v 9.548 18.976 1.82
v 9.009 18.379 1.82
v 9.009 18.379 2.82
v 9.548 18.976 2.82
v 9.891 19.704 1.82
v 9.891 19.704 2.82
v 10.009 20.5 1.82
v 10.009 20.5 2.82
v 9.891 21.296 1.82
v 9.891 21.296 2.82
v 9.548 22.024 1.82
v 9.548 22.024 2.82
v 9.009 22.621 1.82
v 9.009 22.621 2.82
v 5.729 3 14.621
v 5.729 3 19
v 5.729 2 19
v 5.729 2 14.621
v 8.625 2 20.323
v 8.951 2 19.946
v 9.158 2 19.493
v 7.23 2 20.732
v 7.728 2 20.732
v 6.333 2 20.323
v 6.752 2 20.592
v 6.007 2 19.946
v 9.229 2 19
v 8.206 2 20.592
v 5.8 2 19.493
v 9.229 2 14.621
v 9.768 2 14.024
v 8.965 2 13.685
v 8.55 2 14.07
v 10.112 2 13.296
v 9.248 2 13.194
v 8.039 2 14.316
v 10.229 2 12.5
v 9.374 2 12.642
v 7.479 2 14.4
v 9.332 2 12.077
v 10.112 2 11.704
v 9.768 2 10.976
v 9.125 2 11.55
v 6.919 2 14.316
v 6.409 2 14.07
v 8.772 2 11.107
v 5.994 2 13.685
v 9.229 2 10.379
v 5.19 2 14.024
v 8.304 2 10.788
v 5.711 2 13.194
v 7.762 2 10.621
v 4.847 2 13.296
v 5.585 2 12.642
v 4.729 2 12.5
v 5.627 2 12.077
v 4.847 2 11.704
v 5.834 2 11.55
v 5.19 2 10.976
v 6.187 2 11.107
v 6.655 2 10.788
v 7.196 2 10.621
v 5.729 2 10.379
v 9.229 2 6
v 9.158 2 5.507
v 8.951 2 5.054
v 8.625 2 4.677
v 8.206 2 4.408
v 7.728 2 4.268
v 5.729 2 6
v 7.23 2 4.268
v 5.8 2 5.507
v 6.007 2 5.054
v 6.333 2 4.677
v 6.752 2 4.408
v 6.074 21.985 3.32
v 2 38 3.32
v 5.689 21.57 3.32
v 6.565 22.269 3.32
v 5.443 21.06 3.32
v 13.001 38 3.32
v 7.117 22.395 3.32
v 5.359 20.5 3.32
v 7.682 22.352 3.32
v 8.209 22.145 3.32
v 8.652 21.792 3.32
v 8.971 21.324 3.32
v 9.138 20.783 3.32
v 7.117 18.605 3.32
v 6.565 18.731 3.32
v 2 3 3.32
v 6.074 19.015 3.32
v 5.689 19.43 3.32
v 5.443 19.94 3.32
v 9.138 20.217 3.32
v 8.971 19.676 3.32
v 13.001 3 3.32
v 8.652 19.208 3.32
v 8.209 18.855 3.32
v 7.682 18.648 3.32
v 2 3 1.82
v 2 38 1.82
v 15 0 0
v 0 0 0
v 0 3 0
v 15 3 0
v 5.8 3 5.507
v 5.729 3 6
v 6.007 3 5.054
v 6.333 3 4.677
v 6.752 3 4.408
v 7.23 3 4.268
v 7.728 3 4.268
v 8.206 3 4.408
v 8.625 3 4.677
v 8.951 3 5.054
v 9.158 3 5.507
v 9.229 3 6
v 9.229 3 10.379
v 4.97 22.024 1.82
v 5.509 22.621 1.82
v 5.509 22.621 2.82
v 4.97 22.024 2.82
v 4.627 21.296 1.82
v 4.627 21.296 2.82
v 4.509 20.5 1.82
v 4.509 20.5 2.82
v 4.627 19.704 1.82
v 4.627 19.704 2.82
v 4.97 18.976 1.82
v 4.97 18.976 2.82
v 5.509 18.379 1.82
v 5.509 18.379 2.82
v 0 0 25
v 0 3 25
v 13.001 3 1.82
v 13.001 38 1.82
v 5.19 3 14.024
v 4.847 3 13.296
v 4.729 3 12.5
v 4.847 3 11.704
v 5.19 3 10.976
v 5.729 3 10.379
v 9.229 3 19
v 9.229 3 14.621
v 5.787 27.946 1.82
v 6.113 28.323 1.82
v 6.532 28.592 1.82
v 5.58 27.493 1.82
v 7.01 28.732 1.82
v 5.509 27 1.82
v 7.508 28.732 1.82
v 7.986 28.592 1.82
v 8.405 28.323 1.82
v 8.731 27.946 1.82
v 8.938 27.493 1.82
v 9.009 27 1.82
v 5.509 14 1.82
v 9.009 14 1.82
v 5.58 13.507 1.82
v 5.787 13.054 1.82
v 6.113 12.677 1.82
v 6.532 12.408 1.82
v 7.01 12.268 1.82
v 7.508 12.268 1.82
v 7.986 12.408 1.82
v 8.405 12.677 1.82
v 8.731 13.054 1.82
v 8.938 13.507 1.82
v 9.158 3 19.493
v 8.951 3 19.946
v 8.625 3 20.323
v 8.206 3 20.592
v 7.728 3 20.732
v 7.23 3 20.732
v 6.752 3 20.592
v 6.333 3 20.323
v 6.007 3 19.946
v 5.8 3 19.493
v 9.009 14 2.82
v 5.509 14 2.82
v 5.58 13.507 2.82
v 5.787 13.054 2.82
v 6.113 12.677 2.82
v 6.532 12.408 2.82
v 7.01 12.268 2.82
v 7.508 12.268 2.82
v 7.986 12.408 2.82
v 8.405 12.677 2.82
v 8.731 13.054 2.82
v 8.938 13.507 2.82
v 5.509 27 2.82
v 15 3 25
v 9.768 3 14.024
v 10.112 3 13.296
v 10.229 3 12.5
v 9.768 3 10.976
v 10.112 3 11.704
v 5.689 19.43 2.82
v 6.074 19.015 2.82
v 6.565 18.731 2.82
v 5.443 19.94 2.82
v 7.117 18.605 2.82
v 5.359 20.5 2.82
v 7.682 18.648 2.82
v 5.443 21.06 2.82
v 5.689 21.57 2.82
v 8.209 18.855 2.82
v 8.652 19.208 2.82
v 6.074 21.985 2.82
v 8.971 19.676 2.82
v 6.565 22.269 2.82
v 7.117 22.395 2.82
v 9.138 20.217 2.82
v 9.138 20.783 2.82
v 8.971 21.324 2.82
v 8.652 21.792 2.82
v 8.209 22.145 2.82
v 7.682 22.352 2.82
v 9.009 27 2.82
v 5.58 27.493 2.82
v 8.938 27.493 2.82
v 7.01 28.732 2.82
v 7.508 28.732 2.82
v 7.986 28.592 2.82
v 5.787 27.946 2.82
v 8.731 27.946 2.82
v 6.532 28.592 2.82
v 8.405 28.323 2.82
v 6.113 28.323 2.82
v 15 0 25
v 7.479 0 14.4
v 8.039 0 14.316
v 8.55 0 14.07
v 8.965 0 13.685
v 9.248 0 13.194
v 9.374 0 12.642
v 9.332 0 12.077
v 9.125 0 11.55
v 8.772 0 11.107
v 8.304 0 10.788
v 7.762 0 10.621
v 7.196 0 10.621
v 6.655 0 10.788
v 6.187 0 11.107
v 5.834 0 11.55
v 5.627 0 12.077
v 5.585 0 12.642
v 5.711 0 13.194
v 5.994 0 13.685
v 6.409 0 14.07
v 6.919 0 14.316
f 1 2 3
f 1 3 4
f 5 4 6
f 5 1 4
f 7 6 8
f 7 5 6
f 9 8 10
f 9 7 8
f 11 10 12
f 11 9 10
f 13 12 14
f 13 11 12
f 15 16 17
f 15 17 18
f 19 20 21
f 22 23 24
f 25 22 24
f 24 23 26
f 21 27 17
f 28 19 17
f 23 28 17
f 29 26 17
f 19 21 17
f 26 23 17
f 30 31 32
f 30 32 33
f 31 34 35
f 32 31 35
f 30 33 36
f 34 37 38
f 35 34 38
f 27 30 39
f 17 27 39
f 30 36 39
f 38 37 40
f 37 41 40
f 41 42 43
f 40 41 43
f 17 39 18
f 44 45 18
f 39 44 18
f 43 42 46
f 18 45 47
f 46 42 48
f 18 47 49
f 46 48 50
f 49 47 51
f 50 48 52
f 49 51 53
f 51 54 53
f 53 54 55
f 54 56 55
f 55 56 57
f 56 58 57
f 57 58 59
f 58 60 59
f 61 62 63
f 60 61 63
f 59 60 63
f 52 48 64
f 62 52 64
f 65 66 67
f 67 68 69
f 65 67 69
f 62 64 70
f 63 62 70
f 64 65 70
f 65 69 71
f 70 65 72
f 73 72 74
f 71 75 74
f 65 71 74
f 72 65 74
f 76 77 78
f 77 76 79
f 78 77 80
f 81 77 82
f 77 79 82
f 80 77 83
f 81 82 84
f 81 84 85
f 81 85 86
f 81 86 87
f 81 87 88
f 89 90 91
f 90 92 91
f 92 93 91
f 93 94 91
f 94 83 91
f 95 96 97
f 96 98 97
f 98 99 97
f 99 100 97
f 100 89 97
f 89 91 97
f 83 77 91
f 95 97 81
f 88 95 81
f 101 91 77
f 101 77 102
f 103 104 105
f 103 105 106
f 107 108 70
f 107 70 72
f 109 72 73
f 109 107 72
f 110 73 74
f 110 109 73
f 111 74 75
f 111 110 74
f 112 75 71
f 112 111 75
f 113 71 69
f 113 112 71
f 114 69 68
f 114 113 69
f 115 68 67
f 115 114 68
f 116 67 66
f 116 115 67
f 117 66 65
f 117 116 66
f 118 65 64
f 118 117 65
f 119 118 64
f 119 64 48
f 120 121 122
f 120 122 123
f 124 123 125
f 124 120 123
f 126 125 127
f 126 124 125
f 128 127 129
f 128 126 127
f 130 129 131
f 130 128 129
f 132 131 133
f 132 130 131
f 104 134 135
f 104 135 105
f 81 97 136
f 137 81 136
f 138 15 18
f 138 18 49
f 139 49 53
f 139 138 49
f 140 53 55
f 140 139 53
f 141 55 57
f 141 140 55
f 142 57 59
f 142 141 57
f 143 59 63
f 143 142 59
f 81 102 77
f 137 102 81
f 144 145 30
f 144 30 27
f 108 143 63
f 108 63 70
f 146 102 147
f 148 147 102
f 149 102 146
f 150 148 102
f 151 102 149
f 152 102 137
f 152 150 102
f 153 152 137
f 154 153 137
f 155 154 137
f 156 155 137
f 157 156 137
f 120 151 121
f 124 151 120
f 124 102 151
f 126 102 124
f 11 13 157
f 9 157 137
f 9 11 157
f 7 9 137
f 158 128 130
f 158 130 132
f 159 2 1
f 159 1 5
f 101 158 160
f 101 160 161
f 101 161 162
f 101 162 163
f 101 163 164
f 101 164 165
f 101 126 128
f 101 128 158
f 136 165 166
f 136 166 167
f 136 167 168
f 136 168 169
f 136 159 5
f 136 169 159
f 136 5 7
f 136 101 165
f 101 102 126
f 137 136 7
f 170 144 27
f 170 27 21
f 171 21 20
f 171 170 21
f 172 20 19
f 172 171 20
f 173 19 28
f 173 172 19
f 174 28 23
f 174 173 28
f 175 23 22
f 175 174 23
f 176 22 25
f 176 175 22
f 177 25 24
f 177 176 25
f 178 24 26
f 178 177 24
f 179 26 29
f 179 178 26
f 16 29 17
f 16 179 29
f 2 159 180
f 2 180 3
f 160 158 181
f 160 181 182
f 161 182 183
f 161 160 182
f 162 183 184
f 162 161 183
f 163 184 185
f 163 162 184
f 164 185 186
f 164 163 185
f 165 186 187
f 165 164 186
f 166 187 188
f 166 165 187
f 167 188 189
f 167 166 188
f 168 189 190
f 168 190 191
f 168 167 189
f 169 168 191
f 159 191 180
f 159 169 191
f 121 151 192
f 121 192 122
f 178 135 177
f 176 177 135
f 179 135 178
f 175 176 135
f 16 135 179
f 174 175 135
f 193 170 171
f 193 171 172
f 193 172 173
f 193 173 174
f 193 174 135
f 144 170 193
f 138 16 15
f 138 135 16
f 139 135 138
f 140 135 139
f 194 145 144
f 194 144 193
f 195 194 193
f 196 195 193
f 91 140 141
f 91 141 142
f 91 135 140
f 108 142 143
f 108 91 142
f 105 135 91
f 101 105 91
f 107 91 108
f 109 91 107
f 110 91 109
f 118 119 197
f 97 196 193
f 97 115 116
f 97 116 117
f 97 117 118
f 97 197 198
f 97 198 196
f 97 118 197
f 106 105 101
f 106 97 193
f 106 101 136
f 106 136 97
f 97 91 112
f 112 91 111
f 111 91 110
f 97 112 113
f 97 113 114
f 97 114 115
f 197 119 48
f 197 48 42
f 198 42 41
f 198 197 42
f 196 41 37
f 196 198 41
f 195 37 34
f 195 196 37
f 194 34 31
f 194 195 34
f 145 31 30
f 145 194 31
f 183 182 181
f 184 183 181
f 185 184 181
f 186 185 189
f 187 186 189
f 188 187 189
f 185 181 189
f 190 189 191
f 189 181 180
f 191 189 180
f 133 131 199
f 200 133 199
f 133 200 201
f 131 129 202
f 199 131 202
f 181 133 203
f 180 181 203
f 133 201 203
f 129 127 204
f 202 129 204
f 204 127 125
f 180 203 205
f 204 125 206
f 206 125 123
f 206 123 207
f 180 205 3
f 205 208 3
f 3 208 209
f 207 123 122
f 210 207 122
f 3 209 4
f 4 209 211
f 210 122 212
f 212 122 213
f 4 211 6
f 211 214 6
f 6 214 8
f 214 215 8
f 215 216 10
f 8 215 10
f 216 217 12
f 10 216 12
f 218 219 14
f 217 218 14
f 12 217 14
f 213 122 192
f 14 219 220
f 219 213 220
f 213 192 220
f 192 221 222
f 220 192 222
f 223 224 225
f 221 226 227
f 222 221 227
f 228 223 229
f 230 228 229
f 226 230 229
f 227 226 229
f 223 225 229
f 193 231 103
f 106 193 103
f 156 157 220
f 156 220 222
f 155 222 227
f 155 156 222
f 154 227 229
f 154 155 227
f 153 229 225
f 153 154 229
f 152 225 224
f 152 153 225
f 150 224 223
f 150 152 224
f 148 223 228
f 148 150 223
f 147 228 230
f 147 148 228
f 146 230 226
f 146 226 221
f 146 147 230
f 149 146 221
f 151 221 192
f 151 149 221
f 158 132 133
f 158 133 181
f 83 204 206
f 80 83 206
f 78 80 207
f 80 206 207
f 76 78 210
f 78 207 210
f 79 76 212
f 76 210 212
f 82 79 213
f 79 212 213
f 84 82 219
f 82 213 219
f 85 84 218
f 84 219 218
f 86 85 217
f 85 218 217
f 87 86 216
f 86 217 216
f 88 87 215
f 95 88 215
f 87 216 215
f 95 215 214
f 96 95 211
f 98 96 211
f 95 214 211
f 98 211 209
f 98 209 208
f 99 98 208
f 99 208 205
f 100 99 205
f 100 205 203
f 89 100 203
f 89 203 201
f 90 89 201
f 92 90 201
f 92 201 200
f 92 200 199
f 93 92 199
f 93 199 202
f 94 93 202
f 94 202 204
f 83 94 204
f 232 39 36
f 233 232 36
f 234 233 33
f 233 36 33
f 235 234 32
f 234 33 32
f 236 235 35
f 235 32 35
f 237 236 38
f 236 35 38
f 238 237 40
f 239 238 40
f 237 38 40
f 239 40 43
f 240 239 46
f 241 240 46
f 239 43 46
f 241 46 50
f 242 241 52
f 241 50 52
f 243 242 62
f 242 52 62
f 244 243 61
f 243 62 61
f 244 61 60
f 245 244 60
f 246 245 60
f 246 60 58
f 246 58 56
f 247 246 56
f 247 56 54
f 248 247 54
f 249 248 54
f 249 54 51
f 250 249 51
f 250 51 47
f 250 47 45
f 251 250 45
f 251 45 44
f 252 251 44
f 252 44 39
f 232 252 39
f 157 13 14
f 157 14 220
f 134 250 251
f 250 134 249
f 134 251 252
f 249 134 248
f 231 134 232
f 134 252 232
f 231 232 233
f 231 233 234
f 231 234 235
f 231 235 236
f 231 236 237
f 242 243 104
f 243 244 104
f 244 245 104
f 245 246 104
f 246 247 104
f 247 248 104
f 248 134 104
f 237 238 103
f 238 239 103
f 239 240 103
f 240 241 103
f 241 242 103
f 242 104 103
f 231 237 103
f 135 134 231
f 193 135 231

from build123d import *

# Parameters (mm, degrees)
SKETCH_1_W          = 15
SKETCH_1_H          = 25
EXTRUDE_1_DEPTH     = 3
CUT_EXTRUDE_1_DEPTH = 1
SKETCH_3_R          = 1.9
CUT_EXTRUDE_2_DEPTH = 30.223278392
SKETCH_4_W          = 11.000545076
SKETCH_4_H          = 1.5
EXTRUDE_2_DEPTH     = 35
CUT_EXTRUDE_3_DEPTH = 1
SKETCH_6_R          = 1.9
CUT_EXTRUDE_4_DEPTH = 10


with BuildPart() as part:
    # 草图1 → 凸台-拉伸1 (new body)
    with BuildSketch(Plane(origin=(0, 0, 0), x_dir=(1, 0, 0), z_dir=(0, 1, 0))):
        with Locations((7.5, -12.5)):
            Rectangle(SKETCH_1_W, SKETCH_1_H)
    extrude(amount=EXTRUDE_1_DEPTH)

    # 草图2 → 切除-拉伸1 (cut)
    with BuildSketch(Plane(origin=(0, 3, 0), x_dir=(1, 0, 0), z_dir=(0, 1, 0))):
        with BuildLine():
            Line((9.229285522, -6), (9.229285522, -10.378679656))
            ThreePointArc((9.229285522, -10.378679656), (10.229285522, -12.5), (9.229285522, -14.621320344))
            Line((9.229285522, -14.621320344), (9.229285522, -19))
            ThreePointArc((9.229285522, -19), (7.479285522, -20.75), (5.729285522, -19))
            Line((5.729285522, -19), (5.729285522, -14.621320344))
            ThreePointArc((5.729285522, -14.621320344), (4.729285522, -12.5), (5.729285522, -10.378679656))
            Line((5.729285522, -10.378679656), (5.729285522, -6))
            ThreePointArc((5.729285522, -6), (7.479285522, -4.25), (9.229285522, -6))
        make_face()
    extrude(amount=-CUT_EXTRUDE_1_DEPTH, mode=Mode.SUBTRACT)

    # 草图3 → 切除-拉伸2 (cut, through all)
    with BuildSketch(Plane(origin=(0, 2, 0), x_dir=(1, 0, 0), z_dir=(0, 1, 0))):
        with Locations(Location((7.479285522, -12.5, 0), (0, 0, 270))):
            Circle(SKETCH_3_R)
    extrude(amount=-CUT_EXTRUDE_2_DEPTH, mode=Mode.SUBTRACT)

    # 草图4 → 凸台-拉伸2 (add)
    with BuildSketch(Plane(origin=(0, 3, 0), x_dir=(1, 0, 0), z_dir=(0, 1, 0))):
        with Locations((7.500272538, -2.569906393)):
            Rectangle(SKETCH_4_W, SKETCH_4_H)
    extrude(amount=EXTRUDE_2_DEPTH)

    # 草图5 → 切除-拉伸3 (cut)
    with BuildSketch(Plane(origin=(0, 0, 1.819906393), x_dir=(-1, 0, 0), z_dir=(0, 0, -1))):
        with BuildLine():
            Line((-9.008775904, 14), (-9.008775904, 18.378679656))
            ThreePointArc((-9.008775904, 18.378679656), (-10.008775904, 20.5), (-9.008775904, 22.621320344))
            Line((-9.008775904, 22.621320344), (-9.008775904, 27))
            ThreePointArc((-9.008775904, 27), (-7.258775904, 28.75), (-5.508775904, 27))
            Line((-5.508775904, 27), (-5.508775904, 22.621320344))
            ThreePointArc((-5.508775904, 22.621320344), (-4.508775904, 20.5), (-5.508775904, 18.378679656))
            Line((-5.508775904, 18.378679656), (-5.508775904, 14))
            ThreePointArc((-5.508775904, 14), (-7.258775904, 12.25), (-9.008775904, 14))
        make_face()
    extrude(amount=-CUT_EXTRUDE_3_DEPTH, mode=Mode.SUBTRACT)

    # 草图6 → 切除-拉伸4 (cut)
    with BuildSketch(Plane(origin=(0, 0, 2.819906393), x_dir=(-1, 0, 0), z_dir=(0, 0, -1))):
        with Locations((-7.258775904, 20.5)):
            Circle(SKETCH_6_R)
    extrude(amount=-CUT_EXTRUDE_4_DEPTH, mode=Mode.SUBTRACT)


solid = part.part
